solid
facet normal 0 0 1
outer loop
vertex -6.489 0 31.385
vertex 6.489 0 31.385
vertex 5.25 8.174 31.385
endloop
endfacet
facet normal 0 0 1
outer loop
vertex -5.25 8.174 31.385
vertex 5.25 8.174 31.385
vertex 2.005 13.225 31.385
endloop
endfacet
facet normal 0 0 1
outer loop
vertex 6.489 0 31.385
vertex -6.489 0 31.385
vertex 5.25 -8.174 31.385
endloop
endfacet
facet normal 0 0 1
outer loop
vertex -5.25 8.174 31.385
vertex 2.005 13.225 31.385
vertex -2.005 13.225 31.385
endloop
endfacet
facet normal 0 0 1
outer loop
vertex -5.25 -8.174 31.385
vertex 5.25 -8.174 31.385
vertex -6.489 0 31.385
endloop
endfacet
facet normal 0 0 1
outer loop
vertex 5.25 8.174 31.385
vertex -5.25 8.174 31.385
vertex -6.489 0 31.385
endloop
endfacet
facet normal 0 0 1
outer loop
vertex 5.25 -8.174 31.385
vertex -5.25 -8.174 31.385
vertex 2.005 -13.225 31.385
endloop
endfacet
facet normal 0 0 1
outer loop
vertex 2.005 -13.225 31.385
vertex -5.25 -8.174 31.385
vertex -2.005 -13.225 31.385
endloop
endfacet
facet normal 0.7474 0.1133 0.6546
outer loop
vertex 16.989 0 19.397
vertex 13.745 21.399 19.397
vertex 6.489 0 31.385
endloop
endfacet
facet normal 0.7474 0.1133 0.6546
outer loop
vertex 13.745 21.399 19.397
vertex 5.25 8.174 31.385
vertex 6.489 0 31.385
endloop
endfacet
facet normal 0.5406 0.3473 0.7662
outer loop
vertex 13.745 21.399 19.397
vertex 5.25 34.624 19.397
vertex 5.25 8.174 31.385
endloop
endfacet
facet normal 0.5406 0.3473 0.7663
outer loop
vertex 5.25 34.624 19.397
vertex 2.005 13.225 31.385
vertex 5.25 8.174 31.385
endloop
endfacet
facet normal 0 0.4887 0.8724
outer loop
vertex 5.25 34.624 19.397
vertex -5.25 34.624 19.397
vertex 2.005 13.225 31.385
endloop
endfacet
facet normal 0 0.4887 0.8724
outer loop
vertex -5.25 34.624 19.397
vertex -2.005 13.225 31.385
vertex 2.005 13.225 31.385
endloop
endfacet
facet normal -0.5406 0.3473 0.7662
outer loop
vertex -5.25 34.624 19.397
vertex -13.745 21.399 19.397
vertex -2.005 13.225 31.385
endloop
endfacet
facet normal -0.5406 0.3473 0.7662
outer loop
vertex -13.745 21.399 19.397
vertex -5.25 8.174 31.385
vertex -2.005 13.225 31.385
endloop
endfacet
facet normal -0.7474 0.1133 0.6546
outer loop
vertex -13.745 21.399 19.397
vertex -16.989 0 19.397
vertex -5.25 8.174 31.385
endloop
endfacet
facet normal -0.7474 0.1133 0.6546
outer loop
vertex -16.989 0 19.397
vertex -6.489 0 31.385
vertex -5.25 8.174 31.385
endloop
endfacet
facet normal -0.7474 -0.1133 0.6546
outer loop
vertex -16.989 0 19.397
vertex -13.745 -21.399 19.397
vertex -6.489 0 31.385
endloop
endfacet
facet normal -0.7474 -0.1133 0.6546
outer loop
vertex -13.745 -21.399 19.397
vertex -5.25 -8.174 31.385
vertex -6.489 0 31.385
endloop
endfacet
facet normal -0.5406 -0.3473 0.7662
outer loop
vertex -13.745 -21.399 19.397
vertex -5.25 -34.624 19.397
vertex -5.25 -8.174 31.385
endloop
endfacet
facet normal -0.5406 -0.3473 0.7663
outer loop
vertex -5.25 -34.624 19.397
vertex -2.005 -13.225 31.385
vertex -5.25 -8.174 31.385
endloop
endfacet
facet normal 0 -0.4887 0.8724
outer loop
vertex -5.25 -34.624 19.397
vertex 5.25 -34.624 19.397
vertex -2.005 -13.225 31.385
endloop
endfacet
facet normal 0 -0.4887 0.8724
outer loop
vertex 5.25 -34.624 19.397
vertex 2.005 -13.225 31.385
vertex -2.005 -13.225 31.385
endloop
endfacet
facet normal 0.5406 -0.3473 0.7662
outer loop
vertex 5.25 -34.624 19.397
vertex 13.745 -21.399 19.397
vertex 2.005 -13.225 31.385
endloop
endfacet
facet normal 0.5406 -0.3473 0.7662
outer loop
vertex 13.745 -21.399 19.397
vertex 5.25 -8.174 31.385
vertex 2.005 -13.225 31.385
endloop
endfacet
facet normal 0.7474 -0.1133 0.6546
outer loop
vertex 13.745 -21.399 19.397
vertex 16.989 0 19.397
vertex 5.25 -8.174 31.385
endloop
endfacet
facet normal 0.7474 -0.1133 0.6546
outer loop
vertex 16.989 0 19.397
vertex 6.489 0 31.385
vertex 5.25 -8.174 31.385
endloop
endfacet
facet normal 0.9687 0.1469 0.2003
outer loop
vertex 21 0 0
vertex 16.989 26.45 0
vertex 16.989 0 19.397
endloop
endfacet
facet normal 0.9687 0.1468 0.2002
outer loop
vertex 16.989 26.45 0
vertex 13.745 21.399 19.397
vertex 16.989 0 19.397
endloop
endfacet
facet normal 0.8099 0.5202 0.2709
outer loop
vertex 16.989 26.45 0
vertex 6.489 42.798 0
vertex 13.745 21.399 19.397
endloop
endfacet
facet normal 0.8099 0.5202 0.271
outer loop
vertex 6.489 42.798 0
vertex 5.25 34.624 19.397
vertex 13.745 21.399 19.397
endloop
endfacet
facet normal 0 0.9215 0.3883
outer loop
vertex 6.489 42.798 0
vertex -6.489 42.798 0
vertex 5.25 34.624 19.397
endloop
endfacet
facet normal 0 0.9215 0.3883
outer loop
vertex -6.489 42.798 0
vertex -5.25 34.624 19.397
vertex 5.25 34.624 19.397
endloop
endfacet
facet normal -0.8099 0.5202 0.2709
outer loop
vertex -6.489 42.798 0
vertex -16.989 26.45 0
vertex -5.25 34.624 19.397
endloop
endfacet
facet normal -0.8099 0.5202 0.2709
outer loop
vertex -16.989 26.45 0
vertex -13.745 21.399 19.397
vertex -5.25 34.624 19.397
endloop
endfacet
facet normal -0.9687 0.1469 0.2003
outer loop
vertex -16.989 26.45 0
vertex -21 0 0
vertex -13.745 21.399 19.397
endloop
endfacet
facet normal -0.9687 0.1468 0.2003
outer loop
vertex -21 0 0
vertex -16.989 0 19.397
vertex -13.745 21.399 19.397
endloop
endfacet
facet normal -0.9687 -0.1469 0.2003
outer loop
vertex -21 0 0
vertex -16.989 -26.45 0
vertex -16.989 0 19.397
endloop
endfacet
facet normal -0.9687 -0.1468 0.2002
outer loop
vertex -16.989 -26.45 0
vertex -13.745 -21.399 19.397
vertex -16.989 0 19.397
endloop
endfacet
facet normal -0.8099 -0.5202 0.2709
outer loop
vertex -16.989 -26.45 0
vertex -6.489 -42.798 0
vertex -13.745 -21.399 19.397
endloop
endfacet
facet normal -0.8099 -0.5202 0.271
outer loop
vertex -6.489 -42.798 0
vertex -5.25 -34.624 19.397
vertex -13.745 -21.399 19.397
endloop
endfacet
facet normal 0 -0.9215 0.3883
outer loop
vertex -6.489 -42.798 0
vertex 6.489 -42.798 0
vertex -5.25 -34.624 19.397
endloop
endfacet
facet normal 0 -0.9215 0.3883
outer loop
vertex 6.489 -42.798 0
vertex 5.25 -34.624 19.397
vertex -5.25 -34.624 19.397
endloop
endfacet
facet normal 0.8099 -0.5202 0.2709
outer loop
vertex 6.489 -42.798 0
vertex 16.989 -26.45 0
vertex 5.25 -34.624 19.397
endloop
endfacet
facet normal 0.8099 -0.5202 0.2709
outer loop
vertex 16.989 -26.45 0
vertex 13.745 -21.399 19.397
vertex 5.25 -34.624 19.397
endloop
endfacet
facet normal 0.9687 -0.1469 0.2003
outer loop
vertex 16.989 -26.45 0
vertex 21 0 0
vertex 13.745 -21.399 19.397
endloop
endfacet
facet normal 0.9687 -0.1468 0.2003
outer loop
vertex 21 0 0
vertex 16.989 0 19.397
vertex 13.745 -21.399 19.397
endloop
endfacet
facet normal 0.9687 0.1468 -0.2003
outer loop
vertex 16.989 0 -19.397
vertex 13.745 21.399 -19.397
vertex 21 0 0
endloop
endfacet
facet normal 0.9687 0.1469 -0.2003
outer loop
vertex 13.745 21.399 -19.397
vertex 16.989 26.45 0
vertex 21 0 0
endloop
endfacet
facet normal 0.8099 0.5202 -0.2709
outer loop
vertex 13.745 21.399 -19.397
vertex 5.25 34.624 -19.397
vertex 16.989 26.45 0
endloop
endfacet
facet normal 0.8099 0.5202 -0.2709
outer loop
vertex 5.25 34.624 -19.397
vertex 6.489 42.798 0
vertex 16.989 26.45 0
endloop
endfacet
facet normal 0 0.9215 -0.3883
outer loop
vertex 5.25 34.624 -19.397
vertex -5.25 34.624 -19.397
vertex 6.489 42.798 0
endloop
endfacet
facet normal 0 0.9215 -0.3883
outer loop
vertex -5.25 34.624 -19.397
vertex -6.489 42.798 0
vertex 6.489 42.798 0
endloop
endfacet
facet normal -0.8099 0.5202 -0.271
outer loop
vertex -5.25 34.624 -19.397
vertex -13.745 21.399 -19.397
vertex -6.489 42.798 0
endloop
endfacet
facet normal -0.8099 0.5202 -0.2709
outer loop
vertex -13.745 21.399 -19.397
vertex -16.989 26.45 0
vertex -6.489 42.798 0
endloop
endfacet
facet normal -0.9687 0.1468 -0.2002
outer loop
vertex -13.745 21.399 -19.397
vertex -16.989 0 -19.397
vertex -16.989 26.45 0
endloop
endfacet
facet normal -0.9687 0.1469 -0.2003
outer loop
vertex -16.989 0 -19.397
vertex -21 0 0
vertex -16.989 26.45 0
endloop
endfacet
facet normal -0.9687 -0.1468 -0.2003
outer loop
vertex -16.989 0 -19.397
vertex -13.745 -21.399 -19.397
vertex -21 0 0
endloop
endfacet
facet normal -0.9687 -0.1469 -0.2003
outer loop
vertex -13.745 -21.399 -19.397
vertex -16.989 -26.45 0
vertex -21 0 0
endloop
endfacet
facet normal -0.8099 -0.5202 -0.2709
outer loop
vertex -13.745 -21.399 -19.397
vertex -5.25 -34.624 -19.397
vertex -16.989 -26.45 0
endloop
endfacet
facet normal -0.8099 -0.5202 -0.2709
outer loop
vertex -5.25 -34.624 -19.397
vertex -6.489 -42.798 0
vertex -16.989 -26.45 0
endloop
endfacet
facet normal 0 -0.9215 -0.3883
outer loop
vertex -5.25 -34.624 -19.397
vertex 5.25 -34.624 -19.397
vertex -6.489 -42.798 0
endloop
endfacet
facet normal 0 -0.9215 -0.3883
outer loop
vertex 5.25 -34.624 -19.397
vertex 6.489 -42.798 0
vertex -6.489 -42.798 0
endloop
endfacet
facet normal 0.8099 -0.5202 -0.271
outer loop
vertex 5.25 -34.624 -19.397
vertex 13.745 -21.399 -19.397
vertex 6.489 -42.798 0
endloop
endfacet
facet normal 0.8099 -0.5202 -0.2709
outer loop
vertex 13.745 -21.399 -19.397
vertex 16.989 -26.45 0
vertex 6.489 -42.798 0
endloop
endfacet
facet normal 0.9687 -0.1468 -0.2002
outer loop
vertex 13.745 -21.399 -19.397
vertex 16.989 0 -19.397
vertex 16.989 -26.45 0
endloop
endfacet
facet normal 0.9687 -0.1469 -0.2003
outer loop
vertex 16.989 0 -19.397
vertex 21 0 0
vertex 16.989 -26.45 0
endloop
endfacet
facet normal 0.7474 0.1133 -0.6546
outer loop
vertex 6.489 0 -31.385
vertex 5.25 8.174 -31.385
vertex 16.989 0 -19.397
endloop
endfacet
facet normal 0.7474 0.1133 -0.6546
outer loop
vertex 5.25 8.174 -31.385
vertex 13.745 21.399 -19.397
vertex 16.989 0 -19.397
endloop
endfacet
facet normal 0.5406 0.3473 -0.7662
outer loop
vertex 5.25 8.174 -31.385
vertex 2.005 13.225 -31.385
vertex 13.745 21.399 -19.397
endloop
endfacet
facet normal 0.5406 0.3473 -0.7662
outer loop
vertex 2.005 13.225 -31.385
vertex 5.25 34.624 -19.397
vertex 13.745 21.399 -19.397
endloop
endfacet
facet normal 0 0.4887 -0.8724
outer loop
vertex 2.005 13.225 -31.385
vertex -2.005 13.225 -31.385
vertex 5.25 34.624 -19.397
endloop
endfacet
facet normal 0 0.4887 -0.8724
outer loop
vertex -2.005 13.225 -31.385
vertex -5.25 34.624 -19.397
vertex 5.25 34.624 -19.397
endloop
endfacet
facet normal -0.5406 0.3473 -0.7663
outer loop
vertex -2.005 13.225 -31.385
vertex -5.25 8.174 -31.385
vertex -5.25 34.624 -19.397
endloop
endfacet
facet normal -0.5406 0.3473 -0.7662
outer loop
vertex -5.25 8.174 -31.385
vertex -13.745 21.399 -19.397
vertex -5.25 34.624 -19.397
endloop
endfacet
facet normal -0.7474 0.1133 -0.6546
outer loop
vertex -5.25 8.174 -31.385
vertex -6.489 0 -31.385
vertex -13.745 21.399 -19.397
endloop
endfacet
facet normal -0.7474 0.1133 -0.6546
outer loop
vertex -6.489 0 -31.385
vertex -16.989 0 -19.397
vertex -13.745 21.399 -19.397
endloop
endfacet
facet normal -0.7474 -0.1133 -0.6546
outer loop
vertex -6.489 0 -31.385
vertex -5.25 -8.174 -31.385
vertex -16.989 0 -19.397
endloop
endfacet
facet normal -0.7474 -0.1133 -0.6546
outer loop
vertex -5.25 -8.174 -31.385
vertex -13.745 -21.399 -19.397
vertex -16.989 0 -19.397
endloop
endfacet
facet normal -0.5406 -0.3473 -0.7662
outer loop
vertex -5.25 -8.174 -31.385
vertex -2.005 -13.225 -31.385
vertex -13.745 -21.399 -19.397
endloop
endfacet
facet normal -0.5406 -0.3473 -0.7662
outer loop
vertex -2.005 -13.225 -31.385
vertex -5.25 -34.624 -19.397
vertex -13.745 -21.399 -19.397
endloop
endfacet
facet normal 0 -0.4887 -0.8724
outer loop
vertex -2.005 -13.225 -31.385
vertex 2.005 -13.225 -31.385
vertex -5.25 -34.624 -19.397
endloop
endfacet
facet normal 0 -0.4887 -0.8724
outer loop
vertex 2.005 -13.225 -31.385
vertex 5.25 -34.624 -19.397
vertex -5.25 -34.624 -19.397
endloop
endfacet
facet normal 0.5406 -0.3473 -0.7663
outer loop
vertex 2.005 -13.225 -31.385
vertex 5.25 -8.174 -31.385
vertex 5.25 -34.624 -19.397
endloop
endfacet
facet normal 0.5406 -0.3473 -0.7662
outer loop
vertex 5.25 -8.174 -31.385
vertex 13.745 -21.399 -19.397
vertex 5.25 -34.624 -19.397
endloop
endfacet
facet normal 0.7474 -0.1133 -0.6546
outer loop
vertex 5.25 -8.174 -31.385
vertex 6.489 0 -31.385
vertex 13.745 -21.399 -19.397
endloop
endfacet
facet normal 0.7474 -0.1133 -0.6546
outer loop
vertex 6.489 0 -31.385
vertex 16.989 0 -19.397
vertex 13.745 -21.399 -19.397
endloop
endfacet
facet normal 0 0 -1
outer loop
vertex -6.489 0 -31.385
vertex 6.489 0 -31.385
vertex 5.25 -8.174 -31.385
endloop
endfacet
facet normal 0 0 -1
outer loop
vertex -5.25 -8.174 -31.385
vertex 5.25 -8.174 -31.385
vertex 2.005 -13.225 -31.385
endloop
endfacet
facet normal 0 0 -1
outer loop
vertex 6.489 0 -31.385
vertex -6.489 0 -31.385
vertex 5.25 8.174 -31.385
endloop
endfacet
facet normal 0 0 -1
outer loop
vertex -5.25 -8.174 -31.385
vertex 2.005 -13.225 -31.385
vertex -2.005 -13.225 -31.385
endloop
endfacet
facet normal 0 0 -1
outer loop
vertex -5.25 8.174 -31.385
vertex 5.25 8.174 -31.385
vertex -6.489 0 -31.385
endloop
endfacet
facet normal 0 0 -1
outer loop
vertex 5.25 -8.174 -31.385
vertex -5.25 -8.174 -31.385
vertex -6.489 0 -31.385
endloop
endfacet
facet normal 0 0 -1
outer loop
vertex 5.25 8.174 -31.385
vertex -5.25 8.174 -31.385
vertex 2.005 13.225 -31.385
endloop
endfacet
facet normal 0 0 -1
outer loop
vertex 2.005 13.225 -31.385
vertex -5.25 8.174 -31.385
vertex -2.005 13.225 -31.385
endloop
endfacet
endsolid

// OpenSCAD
// Generated by SolidPython 1.0.1 on 2020-07-29 00:46:48


scale(v = [7, 15, 11]) {
	sphere(r = 3);
}
/***********************************************
*********      SolidPython code:      **********
************************************************
 
# import packages: SolidPython
from solid import *
from solid.utils import *
from itertools import chain, combinations, permutations


class Resize:

    def __init__(self, scad_file):
        self.scad_file = scad_file
        #self.scad_file = import_scad(scad_file)
        # cone/cylinder param:
        self.r1 = 0
        self.r2 = 0
        self.h = 0
        # rectangular prism param:
        self.w = 0
        self.l = 0
        # ellipse param:
        self.r = 0

    # import OpenScad code (file name corresponds to shape)


    # classify shape + parameters
    def assign(self, param1, param2, param3):
        if self.scad_file == 'cone.scad':
            self.r1 = param1
            self.r2 = param2
            self.h = param3
        elif self.scad_file == 'cylinder.scad':
            self.r1 = param1
            self.r2 = param2
            self.h = param3
        elif self.scad_file == 'rectangularPrism.scad':
            self.h = param1
            self.l = param2
            self.w = param3
        else:
            self.r = param1
            self.h = param2

    # resize parameters
    def iterate(self):
        x = range(3, 20, 2)
        i = 1
        if self.scad_file == 'cone.scad':
            tempList = list(permutations(x, 2))
            for temp in tempList:
                param1 = temp[0]
                param2 = temp[1]
                filepath = 'produced_scad_files/' + 'cone' + str(param1) + '_' + str(param2) + '_' + '.scad'
                scad_render_to_file(cylinder(h=param1, r1=param2, r2=0), filepath)

        elif self.scad_file == 'cylinder.scad':
            tempList = list(permutations(x, 3))
            for temp in tempList:
                param1 = temp[0]
                param2 = temp[1]
                filepath = 'produced_scad_files/' + 'cylinder' + str(param1) + '_' + str(param2) + '_' + '.scad'
                scad_render_to_file(cylinder(h=param1, r1=param2, r2=param2), filepath)

        elif self.scad_file == 'rectangularPrism.scad':
            tempList = list(permutations(x, 3))
            for temp in tempList:
                param1 = temp[0]
                param2 = temp[1]
                param3 = temp[2]
                filepath = 'produced_scad_files/' + 'rectangularPrism' + str(param1) + '_' + str(param2) + '_' + str(
                    param3) + '.scad'
                scad_render_to_file(cube(size=(param1, param2, param3)), filepath)

        elif self.scad_file == 'ellipse.scad':
            tempList = list(permutations(x, 4))
            for temp in tempList:
                param1 = temp[0]
                param2 = temp[1]
                param3 = temp[2]
                param4 = temp[3]
                filepath = 'produced_scad_files/' + 'ellipse' + str(param1) + '_' + str(param2) + '_' + str(param3) + '_' + str(param4) + '.scad'
                scad_render_to_file(scale([param1, param2, param3])(sphere(r=param4)), filepath)

    def render_to_scadfile(self):
        scad_render_to_file(scad, 'example.scad') 
 
************************************************/
